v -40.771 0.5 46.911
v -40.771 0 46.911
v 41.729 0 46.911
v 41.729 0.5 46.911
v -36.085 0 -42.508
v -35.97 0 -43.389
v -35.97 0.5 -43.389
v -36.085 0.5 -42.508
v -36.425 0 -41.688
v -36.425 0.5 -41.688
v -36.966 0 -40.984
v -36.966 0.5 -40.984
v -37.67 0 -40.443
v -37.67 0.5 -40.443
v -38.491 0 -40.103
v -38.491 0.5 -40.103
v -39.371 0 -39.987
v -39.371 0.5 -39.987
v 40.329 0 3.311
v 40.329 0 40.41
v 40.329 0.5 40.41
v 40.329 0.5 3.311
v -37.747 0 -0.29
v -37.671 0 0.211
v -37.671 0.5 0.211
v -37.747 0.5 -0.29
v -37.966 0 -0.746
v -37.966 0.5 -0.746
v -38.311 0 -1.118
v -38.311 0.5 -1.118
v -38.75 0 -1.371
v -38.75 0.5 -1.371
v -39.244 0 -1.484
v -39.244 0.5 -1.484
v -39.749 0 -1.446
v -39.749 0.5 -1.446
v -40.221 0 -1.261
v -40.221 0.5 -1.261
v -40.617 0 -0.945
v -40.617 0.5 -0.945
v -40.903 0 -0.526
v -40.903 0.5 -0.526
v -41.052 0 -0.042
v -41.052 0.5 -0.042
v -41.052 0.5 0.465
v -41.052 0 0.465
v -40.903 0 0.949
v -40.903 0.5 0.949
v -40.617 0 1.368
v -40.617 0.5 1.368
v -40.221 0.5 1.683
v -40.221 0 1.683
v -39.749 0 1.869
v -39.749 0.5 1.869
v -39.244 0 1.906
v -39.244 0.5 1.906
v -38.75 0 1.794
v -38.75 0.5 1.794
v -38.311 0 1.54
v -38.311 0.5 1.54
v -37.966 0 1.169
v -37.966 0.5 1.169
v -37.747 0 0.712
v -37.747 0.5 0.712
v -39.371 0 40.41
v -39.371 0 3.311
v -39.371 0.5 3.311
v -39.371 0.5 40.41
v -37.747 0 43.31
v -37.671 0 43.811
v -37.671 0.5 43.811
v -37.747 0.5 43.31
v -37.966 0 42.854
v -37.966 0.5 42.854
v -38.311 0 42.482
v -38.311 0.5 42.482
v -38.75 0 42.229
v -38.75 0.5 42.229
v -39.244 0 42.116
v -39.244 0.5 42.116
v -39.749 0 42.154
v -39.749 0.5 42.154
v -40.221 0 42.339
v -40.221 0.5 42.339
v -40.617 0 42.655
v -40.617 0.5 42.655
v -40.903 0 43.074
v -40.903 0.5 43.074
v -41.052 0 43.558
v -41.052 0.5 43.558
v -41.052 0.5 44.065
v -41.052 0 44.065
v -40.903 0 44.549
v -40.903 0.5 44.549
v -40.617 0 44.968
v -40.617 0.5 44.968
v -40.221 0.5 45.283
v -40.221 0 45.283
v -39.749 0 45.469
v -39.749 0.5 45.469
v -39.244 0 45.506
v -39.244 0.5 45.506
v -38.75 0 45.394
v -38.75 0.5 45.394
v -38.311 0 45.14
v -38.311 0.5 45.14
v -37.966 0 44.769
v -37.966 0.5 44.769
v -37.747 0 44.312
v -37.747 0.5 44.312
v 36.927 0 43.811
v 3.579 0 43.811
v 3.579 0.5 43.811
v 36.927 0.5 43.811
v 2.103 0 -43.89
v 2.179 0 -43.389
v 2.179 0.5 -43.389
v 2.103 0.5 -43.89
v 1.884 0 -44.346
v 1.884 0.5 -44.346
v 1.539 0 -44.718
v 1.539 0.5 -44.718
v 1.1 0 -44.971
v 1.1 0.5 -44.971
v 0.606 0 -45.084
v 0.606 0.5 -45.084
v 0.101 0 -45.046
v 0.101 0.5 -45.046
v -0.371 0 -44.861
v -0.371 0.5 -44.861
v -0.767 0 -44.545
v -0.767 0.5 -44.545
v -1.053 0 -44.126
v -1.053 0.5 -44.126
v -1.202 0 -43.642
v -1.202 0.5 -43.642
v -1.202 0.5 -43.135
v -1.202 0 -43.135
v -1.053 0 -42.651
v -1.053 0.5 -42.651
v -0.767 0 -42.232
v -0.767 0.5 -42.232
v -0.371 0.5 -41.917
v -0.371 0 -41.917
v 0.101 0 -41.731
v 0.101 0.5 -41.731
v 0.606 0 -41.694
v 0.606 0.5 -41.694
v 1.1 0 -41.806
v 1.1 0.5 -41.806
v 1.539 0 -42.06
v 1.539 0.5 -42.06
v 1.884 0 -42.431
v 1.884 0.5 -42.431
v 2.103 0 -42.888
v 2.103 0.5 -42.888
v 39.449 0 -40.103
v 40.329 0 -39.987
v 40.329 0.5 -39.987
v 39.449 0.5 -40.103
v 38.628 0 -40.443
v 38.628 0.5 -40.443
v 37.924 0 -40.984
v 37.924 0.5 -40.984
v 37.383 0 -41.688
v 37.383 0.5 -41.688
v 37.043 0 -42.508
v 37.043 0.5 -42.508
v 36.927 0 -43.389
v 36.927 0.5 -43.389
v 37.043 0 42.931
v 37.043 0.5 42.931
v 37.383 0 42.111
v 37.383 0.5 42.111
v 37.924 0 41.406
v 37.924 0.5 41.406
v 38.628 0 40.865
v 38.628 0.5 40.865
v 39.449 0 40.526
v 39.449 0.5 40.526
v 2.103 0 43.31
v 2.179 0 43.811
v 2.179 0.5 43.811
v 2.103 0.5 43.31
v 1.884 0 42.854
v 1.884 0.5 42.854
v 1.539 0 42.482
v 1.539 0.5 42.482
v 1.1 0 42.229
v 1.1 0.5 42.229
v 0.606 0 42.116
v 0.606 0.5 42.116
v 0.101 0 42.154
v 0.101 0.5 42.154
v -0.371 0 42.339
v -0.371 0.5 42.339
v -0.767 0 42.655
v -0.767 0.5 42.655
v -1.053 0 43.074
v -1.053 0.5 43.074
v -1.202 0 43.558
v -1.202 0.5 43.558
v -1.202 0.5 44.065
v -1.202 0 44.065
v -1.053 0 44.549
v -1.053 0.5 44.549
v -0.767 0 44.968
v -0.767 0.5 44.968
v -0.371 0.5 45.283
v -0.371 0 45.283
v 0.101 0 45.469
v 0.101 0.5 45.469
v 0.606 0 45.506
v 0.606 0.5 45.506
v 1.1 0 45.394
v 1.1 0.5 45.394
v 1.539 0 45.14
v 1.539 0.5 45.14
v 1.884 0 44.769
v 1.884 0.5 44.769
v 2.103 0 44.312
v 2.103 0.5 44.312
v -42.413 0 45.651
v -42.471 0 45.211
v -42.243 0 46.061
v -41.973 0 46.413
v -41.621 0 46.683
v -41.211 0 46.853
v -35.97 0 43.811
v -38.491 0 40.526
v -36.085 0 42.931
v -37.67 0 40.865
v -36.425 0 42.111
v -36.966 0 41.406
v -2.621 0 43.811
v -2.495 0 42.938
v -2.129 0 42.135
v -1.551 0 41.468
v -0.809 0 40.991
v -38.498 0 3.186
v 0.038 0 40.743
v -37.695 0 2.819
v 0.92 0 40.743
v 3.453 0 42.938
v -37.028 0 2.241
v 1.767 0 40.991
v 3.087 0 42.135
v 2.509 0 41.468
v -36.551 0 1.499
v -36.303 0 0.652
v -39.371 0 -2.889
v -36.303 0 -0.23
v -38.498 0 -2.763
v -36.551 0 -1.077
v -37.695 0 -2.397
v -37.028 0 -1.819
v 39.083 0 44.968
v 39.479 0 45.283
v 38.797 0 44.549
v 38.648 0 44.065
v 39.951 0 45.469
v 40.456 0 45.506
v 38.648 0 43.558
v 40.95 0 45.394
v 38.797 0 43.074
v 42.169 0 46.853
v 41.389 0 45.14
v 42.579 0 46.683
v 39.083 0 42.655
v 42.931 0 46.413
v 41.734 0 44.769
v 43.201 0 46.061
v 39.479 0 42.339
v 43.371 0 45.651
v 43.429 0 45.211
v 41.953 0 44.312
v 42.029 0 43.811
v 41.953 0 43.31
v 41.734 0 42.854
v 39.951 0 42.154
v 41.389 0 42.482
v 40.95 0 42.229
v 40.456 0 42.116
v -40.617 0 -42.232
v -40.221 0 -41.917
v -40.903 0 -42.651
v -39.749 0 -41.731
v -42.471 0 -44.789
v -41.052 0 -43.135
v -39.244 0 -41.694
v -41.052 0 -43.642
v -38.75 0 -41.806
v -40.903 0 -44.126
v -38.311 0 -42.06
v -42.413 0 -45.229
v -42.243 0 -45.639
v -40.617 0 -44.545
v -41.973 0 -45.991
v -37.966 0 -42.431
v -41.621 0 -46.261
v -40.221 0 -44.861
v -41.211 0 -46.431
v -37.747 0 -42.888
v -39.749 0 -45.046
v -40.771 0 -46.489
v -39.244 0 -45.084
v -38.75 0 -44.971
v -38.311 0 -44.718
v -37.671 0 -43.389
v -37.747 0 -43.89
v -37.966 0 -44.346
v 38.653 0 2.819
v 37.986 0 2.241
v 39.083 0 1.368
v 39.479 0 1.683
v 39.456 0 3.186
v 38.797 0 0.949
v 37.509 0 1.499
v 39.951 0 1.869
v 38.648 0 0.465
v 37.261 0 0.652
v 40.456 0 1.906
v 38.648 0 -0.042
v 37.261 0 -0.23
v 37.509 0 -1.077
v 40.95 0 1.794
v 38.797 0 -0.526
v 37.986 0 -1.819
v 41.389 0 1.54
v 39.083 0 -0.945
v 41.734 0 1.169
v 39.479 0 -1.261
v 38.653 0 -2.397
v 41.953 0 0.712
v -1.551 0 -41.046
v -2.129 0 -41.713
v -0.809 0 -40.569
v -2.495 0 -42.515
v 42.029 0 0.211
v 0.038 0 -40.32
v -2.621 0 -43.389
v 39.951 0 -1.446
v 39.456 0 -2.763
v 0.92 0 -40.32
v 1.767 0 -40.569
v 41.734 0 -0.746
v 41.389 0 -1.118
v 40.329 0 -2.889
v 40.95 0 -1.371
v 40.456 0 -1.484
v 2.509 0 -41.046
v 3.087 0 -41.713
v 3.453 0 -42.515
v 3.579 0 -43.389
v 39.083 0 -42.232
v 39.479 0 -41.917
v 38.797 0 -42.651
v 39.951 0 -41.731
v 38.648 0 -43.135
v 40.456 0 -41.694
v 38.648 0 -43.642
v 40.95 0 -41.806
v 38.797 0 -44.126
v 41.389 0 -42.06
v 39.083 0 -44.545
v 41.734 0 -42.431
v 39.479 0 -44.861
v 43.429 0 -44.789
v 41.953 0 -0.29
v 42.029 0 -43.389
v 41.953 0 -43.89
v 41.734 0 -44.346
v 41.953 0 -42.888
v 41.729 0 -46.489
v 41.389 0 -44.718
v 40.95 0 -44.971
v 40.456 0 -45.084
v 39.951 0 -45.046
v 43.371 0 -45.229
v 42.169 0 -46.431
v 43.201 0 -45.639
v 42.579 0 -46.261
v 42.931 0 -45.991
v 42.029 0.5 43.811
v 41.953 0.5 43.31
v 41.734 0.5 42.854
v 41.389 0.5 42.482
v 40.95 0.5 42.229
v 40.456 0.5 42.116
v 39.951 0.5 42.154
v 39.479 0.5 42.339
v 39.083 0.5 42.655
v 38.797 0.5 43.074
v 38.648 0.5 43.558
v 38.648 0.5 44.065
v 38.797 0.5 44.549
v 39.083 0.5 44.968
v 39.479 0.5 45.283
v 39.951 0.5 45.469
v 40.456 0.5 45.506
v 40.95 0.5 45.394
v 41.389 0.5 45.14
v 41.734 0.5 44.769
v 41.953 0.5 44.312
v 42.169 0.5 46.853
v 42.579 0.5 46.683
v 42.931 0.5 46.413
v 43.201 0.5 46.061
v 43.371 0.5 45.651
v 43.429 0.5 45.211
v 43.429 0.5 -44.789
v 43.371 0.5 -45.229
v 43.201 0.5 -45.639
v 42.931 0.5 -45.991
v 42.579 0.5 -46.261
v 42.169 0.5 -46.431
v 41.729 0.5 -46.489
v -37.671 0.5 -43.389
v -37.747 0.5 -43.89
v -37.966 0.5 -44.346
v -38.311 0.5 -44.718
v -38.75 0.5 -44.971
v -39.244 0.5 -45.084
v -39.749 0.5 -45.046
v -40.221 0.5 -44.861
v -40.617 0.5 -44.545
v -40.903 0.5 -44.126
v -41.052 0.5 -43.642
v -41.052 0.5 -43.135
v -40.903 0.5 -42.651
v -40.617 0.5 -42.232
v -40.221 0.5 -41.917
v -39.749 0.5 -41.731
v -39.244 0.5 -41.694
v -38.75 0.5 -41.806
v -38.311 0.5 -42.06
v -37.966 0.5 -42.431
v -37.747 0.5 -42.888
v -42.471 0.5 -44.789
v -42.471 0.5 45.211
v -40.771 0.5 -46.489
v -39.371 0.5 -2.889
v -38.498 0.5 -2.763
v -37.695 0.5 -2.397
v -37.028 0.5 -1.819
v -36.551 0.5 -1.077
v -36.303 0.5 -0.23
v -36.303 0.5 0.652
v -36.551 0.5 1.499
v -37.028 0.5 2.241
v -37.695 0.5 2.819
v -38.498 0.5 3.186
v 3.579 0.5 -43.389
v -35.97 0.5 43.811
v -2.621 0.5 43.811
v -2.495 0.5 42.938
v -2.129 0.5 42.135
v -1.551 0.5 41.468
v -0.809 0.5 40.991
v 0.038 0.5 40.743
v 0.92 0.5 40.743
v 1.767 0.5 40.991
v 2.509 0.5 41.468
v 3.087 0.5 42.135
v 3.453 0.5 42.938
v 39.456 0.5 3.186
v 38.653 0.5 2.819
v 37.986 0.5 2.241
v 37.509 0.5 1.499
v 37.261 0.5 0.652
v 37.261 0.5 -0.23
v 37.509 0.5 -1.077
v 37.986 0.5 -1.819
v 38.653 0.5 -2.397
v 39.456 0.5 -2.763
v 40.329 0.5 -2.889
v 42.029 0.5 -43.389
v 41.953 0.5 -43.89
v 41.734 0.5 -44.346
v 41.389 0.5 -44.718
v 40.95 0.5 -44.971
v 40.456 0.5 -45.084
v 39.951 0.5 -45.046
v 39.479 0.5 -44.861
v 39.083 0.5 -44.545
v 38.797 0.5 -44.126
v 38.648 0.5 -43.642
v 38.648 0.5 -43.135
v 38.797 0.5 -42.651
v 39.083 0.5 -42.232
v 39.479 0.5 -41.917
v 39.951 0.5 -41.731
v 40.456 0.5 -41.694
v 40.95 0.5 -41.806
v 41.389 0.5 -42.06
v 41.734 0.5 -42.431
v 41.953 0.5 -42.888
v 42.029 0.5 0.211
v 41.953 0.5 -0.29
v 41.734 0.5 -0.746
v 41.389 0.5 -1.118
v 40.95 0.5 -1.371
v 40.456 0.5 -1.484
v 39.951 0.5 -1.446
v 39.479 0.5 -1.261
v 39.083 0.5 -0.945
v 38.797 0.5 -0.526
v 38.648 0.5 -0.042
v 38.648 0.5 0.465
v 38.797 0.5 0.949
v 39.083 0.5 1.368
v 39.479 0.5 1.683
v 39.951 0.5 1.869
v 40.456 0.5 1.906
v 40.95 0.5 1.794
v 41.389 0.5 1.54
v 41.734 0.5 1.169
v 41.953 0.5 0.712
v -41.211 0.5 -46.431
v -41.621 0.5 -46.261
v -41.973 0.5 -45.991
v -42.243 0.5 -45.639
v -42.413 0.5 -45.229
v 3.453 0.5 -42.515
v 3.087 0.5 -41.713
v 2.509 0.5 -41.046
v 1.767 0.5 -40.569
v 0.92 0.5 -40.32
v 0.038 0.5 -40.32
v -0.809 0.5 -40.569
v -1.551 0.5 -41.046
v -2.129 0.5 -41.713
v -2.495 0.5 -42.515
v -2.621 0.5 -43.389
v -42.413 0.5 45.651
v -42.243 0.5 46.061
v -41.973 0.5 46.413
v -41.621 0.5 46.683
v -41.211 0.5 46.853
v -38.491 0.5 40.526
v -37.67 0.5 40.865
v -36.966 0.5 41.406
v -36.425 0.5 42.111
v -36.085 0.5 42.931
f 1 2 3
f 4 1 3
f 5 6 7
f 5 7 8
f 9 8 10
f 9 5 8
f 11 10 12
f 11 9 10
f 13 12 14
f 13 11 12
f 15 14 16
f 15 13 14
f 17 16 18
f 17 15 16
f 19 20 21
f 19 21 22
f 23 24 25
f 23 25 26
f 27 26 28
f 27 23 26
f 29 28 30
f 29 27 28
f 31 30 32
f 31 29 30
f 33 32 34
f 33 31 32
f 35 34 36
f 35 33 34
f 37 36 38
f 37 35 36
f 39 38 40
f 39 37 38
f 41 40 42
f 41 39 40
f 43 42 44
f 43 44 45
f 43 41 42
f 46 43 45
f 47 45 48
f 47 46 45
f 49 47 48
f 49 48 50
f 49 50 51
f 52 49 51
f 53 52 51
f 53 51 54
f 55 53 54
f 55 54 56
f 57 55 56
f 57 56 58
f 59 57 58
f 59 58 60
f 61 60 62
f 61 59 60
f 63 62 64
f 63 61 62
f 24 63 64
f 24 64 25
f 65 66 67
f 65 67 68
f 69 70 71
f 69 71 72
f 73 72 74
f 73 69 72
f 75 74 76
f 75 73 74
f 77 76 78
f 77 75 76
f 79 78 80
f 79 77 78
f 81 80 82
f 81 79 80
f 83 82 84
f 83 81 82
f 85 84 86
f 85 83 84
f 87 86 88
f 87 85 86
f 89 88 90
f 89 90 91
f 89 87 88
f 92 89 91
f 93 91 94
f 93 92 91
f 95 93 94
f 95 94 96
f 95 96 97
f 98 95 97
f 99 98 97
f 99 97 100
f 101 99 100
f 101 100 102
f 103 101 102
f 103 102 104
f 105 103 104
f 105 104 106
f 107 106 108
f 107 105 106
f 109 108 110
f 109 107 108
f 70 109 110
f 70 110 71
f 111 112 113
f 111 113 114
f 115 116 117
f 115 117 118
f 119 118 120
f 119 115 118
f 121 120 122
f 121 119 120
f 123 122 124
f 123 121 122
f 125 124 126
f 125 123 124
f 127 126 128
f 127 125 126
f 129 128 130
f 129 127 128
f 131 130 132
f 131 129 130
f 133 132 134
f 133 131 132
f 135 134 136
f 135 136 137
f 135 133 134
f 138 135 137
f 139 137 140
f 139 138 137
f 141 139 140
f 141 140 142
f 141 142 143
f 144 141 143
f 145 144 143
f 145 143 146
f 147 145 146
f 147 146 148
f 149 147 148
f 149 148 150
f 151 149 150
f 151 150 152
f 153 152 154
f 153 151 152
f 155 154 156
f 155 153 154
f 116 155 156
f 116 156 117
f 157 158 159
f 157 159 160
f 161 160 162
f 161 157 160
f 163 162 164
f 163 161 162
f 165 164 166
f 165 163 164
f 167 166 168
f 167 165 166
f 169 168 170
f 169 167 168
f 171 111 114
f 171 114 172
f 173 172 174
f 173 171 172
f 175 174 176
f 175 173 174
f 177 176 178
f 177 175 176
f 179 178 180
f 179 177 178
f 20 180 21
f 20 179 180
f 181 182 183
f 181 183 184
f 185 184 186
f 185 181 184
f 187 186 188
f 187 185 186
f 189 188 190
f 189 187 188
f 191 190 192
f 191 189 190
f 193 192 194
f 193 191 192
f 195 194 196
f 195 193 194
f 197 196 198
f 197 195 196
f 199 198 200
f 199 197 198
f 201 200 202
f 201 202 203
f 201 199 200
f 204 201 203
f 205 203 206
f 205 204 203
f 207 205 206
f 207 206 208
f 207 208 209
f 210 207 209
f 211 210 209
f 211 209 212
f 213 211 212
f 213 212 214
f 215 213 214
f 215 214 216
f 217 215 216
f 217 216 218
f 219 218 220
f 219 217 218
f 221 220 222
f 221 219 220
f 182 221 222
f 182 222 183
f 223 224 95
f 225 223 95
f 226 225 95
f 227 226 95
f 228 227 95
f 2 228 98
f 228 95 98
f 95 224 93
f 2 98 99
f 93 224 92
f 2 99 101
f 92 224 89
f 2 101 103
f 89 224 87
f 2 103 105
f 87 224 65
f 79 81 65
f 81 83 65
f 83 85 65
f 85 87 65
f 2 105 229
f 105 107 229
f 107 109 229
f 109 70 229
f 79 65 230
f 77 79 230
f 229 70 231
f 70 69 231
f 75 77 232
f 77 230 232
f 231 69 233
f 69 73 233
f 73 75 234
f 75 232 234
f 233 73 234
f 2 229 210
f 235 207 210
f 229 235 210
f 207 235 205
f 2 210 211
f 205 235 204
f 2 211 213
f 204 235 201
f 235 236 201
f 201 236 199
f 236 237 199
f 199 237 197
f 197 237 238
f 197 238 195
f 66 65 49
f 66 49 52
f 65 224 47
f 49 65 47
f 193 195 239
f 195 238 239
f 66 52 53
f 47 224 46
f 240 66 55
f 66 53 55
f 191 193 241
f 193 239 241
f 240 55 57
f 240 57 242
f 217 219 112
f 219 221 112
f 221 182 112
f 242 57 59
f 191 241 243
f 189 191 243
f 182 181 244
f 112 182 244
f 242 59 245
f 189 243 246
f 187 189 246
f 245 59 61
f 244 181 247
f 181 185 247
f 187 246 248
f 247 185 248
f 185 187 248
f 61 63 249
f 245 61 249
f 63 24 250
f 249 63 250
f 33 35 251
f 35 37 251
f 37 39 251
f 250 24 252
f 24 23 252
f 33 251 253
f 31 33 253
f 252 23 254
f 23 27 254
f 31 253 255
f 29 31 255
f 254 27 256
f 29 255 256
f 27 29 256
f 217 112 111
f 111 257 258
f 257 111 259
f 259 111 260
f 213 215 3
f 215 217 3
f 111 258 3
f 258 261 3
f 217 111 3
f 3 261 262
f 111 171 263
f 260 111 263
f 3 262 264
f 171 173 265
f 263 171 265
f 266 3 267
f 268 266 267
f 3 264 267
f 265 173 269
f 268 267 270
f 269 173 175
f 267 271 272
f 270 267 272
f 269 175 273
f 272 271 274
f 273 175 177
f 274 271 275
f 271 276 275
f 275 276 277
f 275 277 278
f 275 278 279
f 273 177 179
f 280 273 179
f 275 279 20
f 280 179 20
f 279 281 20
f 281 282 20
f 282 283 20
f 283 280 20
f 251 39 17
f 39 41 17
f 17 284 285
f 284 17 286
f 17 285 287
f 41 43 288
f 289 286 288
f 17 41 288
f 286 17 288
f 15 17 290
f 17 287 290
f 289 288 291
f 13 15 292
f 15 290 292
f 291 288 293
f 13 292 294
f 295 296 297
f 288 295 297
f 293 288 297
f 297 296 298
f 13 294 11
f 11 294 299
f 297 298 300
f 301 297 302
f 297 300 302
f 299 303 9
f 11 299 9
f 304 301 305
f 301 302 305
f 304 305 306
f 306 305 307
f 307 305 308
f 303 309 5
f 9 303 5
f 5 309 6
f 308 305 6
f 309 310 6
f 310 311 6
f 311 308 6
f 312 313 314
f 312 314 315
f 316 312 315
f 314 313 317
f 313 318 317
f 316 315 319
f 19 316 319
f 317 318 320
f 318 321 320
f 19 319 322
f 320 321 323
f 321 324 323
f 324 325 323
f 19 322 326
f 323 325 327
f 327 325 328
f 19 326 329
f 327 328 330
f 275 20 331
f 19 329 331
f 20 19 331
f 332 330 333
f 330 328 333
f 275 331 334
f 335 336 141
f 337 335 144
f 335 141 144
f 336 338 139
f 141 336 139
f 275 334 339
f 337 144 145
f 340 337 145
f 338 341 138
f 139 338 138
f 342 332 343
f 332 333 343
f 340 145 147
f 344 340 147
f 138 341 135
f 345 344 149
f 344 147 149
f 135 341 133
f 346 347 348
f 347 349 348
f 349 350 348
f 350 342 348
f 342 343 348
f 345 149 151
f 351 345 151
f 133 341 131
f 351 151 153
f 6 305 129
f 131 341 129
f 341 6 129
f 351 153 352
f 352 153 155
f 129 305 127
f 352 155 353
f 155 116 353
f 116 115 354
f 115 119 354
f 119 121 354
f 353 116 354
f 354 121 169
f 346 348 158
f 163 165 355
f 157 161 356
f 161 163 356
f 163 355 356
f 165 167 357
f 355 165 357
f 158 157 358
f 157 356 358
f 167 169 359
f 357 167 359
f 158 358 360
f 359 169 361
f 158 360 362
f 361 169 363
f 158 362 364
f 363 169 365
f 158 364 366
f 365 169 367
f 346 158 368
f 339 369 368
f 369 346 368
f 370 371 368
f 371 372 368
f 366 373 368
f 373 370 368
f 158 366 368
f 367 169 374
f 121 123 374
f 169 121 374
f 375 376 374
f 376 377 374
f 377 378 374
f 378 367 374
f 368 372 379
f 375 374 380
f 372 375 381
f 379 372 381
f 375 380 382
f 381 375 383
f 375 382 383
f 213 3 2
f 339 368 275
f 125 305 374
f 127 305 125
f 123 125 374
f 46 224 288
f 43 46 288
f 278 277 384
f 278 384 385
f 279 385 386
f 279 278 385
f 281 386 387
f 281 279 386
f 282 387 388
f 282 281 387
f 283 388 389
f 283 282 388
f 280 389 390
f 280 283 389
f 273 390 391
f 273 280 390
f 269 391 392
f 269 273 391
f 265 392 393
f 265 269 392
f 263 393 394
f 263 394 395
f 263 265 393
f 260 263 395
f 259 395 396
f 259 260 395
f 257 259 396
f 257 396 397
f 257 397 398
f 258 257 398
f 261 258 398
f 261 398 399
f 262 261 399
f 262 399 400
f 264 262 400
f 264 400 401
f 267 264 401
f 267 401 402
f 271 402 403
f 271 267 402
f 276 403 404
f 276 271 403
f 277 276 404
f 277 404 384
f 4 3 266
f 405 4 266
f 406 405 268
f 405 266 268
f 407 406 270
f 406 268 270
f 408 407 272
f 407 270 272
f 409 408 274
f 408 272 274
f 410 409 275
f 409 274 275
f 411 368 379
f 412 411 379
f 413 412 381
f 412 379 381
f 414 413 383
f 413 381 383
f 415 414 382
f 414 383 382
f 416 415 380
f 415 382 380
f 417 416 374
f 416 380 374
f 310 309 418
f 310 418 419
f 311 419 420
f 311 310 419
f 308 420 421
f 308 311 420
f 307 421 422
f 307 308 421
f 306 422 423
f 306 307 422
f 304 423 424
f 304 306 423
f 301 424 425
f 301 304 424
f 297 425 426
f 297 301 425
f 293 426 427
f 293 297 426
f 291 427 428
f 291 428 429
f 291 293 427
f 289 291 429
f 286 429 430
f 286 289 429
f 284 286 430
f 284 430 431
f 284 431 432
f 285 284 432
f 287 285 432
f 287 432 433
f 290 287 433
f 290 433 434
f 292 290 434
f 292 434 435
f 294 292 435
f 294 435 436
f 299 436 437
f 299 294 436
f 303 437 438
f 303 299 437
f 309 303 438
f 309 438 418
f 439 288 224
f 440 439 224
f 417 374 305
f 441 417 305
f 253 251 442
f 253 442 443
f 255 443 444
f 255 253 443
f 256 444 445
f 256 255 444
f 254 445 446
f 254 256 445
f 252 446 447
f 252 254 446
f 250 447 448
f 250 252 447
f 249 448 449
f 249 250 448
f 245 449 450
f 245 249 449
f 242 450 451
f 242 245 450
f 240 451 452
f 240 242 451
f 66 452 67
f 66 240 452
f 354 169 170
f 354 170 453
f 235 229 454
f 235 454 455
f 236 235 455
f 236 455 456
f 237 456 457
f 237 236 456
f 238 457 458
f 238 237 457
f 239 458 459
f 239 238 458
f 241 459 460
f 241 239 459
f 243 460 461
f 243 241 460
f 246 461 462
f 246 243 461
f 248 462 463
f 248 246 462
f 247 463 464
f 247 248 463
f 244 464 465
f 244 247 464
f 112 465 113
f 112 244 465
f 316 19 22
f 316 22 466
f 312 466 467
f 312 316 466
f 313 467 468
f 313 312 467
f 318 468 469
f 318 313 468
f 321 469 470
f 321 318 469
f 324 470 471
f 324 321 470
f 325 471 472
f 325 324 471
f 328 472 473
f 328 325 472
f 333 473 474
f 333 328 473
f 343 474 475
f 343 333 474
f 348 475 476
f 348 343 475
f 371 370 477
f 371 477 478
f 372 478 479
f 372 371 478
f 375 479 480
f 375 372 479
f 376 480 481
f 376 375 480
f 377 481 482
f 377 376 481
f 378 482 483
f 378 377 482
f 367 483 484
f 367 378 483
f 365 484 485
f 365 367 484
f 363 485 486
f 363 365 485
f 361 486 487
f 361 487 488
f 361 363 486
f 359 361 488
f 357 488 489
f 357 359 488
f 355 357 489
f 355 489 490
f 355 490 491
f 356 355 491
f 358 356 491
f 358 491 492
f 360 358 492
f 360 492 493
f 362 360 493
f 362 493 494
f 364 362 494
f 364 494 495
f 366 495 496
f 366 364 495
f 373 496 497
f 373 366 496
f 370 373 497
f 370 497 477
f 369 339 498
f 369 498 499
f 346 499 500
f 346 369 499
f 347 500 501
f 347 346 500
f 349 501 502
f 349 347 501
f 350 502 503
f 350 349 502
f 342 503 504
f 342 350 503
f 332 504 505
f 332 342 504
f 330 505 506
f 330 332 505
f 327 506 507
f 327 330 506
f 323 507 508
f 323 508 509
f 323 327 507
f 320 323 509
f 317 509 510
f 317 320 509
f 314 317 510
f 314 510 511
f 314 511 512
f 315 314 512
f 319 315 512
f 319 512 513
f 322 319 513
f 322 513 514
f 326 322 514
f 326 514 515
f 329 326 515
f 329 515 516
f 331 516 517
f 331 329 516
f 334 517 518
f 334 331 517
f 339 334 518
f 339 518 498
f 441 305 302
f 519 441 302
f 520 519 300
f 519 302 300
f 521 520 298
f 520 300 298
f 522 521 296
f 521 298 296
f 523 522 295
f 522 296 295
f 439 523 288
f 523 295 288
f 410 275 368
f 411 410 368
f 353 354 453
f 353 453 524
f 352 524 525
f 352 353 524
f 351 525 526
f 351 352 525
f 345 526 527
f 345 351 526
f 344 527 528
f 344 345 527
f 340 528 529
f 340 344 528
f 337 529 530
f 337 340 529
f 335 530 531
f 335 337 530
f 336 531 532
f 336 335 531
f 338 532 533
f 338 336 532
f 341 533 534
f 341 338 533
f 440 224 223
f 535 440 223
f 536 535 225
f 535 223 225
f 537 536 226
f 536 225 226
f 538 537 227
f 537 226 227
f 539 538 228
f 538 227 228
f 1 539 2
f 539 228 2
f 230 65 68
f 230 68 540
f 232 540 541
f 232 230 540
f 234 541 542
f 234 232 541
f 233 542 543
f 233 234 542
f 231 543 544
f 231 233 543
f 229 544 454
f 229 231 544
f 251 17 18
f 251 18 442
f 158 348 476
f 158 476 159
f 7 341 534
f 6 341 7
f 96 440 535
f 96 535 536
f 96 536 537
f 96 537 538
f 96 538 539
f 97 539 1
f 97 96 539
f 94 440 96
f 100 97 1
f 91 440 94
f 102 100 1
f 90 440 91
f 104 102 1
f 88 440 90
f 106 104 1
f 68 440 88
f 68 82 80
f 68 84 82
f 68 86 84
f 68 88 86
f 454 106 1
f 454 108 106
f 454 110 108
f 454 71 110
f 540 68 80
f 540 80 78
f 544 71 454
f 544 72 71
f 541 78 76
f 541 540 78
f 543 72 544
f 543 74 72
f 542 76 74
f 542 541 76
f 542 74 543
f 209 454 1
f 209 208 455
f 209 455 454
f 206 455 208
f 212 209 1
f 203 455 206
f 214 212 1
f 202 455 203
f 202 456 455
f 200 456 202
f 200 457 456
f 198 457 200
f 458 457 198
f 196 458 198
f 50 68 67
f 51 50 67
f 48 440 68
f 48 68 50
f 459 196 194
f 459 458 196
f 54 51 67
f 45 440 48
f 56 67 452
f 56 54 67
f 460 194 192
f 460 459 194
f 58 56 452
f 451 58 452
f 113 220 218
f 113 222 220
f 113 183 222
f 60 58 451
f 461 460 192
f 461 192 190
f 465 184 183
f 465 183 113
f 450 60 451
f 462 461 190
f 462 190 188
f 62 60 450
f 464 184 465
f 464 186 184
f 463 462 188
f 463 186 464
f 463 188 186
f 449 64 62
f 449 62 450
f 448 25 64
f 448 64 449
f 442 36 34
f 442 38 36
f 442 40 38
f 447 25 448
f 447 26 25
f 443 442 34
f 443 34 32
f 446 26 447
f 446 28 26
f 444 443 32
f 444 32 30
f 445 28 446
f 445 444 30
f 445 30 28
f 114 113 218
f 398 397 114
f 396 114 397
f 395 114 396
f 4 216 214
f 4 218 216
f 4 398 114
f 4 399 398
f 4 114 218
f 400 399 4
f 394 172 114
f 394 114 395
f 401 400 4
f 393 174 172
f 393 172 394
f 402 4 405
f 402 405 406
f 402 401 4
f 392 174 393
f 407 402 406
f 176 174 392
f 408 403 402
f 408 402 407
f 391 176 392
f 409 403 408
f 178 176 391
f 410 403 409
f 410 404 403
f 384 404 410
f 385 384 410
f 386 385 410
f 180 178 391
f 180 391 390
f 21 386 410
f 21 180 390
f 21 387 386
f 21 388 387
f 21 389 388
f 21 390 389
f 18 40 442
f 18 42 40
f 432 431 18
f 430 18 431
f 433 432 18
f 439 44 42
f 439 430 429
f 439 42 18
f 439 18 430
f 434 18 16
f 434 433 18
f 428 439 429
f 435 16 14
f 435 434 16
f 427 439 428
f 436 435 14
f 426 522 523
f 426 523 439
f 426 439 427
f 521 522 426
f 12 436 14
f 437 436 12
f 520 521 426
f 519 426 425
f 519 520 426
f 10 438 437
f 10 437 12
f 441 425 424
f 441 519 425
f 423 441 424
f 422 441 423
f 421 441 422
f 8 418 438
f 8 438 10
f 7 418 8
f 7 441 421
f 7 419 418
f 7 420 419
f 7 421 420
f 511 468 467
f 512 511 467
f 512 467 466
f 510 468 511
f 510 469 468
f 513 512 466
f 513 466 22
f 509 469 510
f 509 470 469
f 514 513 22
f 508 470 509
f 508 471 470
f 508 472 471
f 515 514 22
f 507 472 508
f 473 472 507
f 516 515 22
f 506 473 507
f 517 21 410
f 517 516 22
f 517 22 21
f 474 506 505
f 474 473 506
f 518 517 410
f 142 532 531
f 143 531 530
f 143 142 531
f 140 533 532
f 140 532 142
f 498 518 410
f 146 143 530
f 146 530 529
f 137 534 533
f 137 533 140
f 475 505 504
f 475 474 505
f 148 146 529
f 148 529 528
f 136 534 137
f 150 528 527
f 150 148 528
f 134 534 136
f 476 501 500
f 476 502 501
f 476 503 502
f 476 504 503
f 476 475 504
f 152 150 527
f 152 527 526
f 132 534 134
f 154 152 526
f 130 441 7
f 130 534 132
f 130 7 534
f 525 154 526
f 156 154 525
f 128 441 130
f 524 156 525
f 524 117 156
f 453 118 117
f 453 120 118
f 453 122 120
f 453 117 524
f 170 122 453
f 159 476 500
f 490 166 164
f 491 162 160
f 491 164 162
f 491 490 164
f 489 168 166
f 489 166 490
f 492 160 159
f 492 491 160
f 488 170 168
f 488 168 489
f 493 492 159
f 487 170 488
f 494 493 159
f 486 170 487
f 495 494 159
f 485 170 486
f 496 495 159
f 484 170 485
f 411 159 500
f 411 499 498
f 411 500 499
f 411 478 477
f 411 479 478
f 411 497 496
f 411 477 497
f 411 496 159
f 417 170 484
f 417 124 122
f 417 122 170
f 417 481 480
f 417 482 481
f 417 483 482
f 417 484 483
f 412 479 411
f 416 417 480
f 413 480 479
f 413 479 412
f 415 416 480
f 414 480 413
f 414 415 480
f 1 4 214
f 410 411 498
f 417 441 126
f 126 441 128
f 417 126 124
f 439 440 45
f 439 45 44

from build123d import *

# Parameters (mm, degrees)
SKETCH_1_R      = 1.7
EXTRUDE_1_DEPTH = 0.5


with BuildPart() as part:
    # Эскиз1 → Бобышка-Вытянуть1 (new body)
    with BuildSketch(Plane(origin=(0, 0, 0), x_dir=(1, 0, 0), z_dir=(0, 1, 0))):
        with BuildLine():
            Line((-40.771031168, -46.911249121), (41.728968832, -46.911249121))
            ThreePointArc((41.728968832, -46.911249121), (42.93105036, -46.413330649), (43.428968832, -45.211249121))
            Line((43.428968832, -45.211249121), (43.428968832, 44.788750879))
            ThreePointArc((43.428968832, 44.788750879), (42.93105036, 45.990832407), (41.728968832, 46.488750879))
            Line((41.728968832, 46.488750879), (-40.771031168, 46.488750879))
            ThreePointArc((-40.771031168, 46.488750879), (-41.973112696, 45.990832407), (-42.471031168, 44.788750879))
            Line((-42.471031168, 44.788750879), (-42.471031168, -45.211249121))
            ThreePointArc((-42.471031168, -45.211249121), (-41.973112696, -46.413330649), (-40.771031168, -46.911249121))
        make_face()
        with Locations((-39.371031168, -0.211249121)):
            Circle(SKETCH_1_R, mode=Mode.SUBTRACT)
        with Locations((-39.371031168, -43.811249121)):
            Circle(SKETCH_1_R, mode=Mode.SUBTRACT)
        with Locations((0.478968832, -43.811249121)):
            Circle(SKETCH_1_R, mode=Mode.SUBTRACT)
        with Locations((40.328968832, -43.811249121)):
            Circle(SKETCH_1_R, mode=Mode.SUBTRACT)
        with Locations((40.328968832, -0.211249121)):
            Circle(SKETCH_1_R, mode=Mode.SUBTRACT)
        with Locations((40.328968832, 43.388750879)):
            Circle(SKETCH_1_R, mode=Mode.SUBTRACT)
        with Locations((0.478968832, 43.388750879)):
            Circle(SKETCH_1_R, mode=Mode.SUBTRACT)
        with Locations((-39.371031168, 43.388750879)):
            Circle(SKETCH_1_R, mode=Mode.SUBTRACT)
        with BuildLine():
            Line((-39.371031168, 39.987280609), (-39.371031168, 2.888750879))
            ThreePointArc((-39.371031168, 2.888750879), (-36.271031168, -0.211249121), (-39.371031168, -3.311249121))
            Line((-39.371031168, -3.311249121), (-39.371031168, -40.40977885))
            ThreePointArc((-39.371031168, -40.40977885), (-36.965828473, -41.406046427), (-35.969560897, -43.811249121))
            Line((-35.969560897, -43.811249121), (-2.621031168, -43.811249121))
            ThreePointArc((-2.621031168, -43.811249121), (0.478968832, -40.711249121), (3.578968832, -43.811249121))
            Line((3.578968832, -43.811249121), (36.927498562, -43.811249121))
            ThreePointArc((36.927498562, -43.811249121), (37.923766138, -41.406046427), (40.328968832, -40.40977885))
            Line((40.328968832, -40.40977885), (40.328968832, -3.311249121))
            ThreePointArc((40.328968832, -3.311249121), (37.228968832, -0.211249121), (40.328968832, 2.888750879))
            Line((40.328968832, 2.888750879), (40.328968832, 39.987280609))
            ThreePointArc((40.328968832, 39.987280609), (37.923766138, 40.983548185), (36.927498562, 43.388750879))
            Line((36.927498562, 43.388750879), (3.578968832, 43.388750879))
            ThreePointArc((3.578968832, 43.388750879), (0.478968832, 40.288750879), (-2.621031168, 43.388750879))
            Line((-2.621031168, 43.388750879), (-35.969560897, 43.388750879))
            ThreePointArc((-35.969560897, 43.388750879), (-36.965828473, 40.983548185), (-39.371031168, 39.987280609))
        make_face(mode=Mode.SUBTRACT)
    extrude(amount=EXTRUDE_1_DEPTH)


solid = part.part
